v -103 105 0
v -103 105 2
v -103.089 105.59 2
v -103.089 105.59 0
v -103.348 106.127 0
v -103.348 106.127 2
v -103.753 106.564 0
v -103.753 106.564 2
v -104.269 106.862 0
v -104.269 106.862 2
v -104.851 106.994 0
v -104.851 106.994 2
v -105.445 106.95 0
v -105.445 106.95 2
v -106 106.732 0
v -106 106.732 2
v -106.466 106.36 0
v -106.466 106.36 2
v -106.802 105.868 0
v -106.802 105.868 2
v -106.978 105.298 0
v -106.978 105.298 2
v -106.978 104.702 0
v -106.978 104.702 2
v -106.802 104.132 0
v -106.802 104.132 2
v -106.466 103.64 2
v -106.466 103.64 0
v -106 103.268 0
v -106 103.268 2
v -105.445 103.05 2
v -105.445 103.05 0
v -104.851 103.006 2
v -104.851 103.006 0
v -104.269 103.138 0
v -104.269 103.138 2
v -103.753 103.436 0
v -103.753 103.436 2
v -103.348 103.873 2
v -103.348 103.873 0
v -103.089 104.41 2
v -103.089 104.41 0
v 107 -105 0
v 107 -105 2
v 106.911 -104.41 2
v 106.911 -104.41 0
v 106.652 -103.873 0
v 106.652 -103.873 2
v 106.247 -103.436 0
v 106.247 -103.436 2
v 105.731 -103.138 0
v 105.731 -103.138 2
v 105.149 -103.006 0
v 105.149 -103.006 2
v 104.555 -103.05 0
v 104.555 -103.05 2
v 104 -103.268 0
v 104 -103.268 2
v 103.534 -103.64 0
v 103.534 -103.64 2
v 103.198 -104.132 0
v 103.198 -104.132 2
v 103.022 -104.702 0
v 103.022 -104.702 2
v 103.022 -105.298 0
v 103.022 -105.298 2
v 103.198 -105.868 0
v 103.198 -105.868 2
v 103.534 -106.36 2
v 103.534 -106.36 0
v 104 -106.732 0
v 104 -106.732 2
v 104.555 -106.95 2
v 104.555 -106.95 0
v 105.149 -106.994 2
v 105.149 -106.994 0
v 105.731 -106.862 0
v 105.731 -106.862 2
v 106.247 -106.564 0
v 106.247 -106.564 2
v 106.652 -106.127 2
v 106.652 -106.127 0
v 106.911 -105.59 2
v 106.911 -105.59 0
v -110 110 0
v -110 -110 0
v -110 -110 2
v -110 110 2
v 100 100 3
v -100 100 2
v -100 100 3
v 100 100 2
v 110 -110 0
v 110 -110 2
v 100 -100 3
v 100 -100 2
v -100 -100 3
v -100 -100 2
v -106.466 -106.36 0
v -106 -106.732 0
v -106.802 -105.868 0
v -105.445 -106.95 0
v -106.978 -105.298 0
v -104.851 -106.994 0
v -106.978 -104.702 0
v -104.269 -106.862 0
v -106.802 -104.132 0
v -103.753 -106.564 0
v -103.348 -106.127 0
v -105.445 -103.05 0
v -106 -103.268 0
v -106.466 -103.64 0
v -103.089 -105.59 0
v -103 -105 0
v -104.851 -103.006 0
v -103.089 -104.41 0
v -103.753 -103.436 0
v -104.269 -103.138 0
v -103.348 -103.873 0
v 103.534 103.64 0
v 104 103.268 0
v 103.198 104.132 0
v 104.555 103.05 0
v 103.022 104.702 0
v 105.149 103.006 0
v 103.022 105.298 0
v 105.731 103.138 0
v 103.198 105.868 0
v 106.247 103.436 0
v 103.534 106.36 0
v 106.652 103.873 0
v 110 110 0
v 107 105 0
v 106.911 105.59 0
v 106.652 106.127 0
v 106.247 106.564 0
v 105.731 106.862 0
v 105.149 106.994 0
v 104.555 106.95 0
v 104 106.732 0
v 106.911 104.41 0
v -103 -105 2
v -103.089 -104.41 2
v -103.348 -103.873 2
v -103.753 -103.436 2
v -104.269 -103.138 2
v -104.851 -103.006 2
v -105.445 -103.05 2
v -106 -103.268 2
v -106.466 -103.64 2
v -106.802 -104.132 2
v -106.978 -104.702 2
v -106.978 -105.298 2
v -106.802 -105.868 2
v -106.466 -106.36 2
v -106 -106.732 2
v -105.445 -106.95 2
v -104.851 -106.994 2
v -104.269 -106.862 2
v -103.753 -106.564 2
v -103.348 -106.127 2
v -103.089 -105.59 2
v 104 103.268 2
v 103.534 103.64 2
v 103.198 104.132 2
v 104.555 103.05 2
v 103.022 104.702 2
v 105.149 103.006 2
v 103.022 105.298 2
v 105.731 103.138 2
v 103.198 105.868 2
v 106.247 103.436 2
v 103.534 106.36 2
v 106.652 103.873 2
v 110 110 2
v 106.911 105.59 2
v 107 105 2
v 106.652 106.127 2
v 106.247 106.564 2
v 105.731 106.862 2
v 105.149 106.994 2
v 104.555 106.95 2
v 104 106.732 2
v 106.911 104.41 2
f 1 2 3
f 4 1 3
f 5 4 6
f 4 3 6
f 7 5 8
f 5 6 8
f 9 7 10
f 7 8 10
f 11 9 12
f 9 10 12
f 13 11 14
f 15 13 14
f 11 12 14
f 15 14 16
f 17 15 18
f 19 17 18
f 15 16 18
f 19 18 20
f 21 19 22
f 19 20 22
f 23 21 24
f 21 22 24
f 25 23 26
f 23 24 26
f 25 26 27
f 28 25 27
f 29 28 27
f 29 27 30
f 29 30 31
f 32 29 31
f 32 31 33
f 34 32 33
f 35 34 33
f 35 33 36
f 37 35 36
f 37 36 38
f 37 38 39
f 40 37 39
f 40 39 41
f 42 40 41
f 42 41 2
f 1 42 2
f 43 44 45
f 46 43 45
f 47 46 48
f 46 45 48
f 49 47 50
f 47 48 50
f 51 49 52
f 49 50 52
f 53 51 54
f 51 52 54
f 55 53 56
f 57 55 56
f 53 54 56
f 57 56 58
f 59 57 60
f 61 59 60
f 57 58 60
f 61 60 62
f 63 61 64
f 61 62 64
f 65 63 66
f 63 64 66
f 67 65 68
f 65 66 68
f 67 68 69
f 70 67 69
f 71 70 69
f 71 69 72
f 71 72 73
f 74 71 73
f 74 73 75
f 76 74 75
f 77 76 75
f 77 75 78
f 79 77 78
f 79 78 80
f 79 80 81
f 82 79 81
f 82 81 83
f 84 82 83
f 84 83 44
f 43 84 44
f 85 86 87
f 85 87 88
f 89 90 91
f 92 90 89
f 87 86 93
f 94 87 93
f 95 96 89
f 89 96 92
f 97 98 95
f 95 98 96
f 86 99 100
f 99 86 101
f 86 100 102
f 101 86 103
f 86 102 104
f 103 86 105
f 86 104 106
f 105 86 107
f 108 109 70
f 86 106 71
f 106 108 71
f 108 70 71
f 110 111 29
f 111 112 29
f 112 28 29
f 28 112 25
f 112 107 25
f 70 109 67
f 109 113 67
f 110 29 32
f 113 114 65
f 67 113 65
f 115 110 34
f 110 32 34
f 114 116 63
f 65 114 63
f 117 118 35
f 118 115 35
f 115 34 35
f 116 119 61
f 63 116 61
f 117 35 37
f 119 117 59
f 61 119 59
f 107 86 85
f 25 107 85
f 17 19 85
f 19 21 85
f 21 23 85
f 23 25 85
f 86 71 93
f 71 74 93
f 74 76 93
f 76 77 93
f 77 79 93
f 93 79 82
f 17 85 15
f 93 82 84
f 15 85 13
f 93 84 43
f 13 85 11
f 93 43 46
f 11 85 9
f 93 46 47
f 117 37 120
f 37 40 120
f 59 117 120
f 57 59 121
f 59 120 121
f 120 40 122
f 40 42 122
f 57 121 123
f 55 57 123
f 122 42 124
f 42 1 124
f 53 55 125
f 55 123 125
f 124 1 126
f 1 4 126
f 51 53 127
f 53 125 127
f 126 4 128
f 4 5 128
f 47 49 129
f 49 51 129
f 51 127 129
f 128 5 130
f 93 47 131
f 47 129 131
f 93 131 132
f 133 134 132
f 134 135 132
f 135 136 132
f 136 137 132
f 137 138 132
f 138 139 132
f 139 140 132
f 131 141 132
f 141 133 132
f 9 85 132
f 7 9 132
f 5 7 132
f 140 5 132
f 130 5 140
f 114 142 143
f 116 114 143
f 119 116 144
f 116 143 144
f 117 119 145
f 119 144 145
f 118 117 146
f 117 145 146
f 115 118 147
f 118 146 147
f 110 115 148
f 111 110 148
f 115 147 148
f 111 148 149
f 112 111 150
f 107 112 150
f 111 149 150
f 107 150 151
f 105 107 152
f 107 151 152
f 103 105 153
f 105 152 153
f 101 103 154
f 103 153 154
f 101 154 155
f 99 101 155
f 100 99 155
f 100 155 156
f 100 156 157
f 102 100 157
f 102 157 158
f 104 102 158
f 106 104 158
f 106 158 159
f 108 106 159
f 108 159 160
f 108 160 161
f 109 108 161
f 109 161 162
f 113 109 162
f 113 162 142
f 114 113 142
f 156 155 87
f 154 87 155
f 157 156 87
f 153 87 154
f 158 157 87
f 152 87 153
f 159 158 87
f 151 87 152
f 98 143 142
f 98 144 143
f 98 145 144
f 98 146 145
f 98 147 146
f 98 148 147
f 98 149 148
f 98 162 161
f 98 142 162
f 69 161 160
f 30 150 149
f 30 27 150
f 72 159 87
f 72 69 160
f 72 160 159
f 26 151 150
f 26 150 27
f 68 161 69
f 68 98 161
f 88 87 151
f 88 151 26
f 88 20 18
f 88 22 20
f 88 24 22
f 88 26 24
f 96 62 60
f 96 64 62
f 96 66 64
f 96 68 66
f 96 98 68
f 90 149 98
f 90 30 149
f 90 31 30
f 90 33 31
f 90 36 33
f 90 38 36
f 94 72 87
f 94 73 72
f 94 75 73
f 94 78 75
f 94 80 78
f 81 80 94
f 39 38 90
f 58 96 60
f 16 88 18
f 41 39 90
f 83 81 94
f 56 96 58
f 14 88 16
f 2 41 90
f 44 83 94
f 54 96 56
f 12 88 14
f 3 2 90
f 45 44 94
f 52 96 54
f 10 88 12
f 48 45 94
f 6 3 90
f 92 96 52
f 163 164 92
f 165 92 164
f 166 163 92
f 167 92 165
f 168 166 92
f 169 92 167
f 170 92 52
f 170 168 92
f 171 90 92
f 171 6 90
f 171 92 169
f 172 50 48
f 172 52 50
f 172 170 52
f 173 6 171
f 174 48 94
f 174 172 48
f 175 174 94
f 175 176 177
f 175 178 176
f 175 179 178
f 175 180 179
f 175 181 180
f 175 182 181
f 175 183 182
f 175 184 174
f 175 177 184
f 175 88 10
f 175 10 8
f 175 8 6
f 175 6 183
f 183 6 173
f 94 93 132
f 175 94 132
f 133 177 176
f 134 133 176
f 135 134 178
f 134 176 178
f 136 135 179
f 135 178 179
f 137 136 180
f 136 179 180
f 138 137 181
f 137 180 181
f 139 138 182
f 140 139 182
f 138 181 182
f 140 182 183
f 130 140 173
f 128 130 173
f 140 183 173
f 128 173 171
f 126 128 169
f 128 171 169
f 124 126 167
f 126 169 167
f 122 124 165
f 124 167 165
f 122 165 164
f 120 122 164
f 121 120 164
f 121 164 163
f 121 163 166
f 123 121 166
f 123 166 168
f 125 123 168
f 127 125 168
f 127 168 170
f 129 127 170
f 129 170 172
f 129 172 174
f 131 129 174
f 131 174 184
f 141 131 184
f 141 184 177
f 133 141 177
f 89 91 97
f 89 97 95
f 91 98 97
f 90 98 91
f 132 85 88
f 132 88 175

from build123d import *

# Parameters (mm, degrees)
F0_W     = 220
F0_H     = 220
F1_DEPTH = 2
F2_R     = 2
F3_DEPTH = 25
F4_W     = 200
F4_H     = 200
F5_DEPTH = 1


with BuildPart() as f1:
    # F0 (on Top) → F1 (new body)
    with BuildSketch(Plane.XY):
        Rectangle(F0_W, F0_H)
    extrude(amount=F1_DEPTH)

    # F2 (on face) → F3 (cut)
    with BuildSketch(Plane.XY.offset(2)):
        with Locations((-105, -105)):
            Circle(F2_R)
        with Locations((105, -105)):
            Circle(F2_R)
        with Locations((105, 105)):
            Circle(F2_R)
        with Locations((-105, 105)):
            Circle(F2_R)
    extrude(amount=-F3_DEPTH, mode=Mode.SUBTRACT)

    # F4 (on face) → F5 (join)
    with BuildSketch(Plane.XY.offset(2)):
        Rectangle(F4_W, F4_H)
    extrude(amount=F5_DEPTH)


solid = f1.part
